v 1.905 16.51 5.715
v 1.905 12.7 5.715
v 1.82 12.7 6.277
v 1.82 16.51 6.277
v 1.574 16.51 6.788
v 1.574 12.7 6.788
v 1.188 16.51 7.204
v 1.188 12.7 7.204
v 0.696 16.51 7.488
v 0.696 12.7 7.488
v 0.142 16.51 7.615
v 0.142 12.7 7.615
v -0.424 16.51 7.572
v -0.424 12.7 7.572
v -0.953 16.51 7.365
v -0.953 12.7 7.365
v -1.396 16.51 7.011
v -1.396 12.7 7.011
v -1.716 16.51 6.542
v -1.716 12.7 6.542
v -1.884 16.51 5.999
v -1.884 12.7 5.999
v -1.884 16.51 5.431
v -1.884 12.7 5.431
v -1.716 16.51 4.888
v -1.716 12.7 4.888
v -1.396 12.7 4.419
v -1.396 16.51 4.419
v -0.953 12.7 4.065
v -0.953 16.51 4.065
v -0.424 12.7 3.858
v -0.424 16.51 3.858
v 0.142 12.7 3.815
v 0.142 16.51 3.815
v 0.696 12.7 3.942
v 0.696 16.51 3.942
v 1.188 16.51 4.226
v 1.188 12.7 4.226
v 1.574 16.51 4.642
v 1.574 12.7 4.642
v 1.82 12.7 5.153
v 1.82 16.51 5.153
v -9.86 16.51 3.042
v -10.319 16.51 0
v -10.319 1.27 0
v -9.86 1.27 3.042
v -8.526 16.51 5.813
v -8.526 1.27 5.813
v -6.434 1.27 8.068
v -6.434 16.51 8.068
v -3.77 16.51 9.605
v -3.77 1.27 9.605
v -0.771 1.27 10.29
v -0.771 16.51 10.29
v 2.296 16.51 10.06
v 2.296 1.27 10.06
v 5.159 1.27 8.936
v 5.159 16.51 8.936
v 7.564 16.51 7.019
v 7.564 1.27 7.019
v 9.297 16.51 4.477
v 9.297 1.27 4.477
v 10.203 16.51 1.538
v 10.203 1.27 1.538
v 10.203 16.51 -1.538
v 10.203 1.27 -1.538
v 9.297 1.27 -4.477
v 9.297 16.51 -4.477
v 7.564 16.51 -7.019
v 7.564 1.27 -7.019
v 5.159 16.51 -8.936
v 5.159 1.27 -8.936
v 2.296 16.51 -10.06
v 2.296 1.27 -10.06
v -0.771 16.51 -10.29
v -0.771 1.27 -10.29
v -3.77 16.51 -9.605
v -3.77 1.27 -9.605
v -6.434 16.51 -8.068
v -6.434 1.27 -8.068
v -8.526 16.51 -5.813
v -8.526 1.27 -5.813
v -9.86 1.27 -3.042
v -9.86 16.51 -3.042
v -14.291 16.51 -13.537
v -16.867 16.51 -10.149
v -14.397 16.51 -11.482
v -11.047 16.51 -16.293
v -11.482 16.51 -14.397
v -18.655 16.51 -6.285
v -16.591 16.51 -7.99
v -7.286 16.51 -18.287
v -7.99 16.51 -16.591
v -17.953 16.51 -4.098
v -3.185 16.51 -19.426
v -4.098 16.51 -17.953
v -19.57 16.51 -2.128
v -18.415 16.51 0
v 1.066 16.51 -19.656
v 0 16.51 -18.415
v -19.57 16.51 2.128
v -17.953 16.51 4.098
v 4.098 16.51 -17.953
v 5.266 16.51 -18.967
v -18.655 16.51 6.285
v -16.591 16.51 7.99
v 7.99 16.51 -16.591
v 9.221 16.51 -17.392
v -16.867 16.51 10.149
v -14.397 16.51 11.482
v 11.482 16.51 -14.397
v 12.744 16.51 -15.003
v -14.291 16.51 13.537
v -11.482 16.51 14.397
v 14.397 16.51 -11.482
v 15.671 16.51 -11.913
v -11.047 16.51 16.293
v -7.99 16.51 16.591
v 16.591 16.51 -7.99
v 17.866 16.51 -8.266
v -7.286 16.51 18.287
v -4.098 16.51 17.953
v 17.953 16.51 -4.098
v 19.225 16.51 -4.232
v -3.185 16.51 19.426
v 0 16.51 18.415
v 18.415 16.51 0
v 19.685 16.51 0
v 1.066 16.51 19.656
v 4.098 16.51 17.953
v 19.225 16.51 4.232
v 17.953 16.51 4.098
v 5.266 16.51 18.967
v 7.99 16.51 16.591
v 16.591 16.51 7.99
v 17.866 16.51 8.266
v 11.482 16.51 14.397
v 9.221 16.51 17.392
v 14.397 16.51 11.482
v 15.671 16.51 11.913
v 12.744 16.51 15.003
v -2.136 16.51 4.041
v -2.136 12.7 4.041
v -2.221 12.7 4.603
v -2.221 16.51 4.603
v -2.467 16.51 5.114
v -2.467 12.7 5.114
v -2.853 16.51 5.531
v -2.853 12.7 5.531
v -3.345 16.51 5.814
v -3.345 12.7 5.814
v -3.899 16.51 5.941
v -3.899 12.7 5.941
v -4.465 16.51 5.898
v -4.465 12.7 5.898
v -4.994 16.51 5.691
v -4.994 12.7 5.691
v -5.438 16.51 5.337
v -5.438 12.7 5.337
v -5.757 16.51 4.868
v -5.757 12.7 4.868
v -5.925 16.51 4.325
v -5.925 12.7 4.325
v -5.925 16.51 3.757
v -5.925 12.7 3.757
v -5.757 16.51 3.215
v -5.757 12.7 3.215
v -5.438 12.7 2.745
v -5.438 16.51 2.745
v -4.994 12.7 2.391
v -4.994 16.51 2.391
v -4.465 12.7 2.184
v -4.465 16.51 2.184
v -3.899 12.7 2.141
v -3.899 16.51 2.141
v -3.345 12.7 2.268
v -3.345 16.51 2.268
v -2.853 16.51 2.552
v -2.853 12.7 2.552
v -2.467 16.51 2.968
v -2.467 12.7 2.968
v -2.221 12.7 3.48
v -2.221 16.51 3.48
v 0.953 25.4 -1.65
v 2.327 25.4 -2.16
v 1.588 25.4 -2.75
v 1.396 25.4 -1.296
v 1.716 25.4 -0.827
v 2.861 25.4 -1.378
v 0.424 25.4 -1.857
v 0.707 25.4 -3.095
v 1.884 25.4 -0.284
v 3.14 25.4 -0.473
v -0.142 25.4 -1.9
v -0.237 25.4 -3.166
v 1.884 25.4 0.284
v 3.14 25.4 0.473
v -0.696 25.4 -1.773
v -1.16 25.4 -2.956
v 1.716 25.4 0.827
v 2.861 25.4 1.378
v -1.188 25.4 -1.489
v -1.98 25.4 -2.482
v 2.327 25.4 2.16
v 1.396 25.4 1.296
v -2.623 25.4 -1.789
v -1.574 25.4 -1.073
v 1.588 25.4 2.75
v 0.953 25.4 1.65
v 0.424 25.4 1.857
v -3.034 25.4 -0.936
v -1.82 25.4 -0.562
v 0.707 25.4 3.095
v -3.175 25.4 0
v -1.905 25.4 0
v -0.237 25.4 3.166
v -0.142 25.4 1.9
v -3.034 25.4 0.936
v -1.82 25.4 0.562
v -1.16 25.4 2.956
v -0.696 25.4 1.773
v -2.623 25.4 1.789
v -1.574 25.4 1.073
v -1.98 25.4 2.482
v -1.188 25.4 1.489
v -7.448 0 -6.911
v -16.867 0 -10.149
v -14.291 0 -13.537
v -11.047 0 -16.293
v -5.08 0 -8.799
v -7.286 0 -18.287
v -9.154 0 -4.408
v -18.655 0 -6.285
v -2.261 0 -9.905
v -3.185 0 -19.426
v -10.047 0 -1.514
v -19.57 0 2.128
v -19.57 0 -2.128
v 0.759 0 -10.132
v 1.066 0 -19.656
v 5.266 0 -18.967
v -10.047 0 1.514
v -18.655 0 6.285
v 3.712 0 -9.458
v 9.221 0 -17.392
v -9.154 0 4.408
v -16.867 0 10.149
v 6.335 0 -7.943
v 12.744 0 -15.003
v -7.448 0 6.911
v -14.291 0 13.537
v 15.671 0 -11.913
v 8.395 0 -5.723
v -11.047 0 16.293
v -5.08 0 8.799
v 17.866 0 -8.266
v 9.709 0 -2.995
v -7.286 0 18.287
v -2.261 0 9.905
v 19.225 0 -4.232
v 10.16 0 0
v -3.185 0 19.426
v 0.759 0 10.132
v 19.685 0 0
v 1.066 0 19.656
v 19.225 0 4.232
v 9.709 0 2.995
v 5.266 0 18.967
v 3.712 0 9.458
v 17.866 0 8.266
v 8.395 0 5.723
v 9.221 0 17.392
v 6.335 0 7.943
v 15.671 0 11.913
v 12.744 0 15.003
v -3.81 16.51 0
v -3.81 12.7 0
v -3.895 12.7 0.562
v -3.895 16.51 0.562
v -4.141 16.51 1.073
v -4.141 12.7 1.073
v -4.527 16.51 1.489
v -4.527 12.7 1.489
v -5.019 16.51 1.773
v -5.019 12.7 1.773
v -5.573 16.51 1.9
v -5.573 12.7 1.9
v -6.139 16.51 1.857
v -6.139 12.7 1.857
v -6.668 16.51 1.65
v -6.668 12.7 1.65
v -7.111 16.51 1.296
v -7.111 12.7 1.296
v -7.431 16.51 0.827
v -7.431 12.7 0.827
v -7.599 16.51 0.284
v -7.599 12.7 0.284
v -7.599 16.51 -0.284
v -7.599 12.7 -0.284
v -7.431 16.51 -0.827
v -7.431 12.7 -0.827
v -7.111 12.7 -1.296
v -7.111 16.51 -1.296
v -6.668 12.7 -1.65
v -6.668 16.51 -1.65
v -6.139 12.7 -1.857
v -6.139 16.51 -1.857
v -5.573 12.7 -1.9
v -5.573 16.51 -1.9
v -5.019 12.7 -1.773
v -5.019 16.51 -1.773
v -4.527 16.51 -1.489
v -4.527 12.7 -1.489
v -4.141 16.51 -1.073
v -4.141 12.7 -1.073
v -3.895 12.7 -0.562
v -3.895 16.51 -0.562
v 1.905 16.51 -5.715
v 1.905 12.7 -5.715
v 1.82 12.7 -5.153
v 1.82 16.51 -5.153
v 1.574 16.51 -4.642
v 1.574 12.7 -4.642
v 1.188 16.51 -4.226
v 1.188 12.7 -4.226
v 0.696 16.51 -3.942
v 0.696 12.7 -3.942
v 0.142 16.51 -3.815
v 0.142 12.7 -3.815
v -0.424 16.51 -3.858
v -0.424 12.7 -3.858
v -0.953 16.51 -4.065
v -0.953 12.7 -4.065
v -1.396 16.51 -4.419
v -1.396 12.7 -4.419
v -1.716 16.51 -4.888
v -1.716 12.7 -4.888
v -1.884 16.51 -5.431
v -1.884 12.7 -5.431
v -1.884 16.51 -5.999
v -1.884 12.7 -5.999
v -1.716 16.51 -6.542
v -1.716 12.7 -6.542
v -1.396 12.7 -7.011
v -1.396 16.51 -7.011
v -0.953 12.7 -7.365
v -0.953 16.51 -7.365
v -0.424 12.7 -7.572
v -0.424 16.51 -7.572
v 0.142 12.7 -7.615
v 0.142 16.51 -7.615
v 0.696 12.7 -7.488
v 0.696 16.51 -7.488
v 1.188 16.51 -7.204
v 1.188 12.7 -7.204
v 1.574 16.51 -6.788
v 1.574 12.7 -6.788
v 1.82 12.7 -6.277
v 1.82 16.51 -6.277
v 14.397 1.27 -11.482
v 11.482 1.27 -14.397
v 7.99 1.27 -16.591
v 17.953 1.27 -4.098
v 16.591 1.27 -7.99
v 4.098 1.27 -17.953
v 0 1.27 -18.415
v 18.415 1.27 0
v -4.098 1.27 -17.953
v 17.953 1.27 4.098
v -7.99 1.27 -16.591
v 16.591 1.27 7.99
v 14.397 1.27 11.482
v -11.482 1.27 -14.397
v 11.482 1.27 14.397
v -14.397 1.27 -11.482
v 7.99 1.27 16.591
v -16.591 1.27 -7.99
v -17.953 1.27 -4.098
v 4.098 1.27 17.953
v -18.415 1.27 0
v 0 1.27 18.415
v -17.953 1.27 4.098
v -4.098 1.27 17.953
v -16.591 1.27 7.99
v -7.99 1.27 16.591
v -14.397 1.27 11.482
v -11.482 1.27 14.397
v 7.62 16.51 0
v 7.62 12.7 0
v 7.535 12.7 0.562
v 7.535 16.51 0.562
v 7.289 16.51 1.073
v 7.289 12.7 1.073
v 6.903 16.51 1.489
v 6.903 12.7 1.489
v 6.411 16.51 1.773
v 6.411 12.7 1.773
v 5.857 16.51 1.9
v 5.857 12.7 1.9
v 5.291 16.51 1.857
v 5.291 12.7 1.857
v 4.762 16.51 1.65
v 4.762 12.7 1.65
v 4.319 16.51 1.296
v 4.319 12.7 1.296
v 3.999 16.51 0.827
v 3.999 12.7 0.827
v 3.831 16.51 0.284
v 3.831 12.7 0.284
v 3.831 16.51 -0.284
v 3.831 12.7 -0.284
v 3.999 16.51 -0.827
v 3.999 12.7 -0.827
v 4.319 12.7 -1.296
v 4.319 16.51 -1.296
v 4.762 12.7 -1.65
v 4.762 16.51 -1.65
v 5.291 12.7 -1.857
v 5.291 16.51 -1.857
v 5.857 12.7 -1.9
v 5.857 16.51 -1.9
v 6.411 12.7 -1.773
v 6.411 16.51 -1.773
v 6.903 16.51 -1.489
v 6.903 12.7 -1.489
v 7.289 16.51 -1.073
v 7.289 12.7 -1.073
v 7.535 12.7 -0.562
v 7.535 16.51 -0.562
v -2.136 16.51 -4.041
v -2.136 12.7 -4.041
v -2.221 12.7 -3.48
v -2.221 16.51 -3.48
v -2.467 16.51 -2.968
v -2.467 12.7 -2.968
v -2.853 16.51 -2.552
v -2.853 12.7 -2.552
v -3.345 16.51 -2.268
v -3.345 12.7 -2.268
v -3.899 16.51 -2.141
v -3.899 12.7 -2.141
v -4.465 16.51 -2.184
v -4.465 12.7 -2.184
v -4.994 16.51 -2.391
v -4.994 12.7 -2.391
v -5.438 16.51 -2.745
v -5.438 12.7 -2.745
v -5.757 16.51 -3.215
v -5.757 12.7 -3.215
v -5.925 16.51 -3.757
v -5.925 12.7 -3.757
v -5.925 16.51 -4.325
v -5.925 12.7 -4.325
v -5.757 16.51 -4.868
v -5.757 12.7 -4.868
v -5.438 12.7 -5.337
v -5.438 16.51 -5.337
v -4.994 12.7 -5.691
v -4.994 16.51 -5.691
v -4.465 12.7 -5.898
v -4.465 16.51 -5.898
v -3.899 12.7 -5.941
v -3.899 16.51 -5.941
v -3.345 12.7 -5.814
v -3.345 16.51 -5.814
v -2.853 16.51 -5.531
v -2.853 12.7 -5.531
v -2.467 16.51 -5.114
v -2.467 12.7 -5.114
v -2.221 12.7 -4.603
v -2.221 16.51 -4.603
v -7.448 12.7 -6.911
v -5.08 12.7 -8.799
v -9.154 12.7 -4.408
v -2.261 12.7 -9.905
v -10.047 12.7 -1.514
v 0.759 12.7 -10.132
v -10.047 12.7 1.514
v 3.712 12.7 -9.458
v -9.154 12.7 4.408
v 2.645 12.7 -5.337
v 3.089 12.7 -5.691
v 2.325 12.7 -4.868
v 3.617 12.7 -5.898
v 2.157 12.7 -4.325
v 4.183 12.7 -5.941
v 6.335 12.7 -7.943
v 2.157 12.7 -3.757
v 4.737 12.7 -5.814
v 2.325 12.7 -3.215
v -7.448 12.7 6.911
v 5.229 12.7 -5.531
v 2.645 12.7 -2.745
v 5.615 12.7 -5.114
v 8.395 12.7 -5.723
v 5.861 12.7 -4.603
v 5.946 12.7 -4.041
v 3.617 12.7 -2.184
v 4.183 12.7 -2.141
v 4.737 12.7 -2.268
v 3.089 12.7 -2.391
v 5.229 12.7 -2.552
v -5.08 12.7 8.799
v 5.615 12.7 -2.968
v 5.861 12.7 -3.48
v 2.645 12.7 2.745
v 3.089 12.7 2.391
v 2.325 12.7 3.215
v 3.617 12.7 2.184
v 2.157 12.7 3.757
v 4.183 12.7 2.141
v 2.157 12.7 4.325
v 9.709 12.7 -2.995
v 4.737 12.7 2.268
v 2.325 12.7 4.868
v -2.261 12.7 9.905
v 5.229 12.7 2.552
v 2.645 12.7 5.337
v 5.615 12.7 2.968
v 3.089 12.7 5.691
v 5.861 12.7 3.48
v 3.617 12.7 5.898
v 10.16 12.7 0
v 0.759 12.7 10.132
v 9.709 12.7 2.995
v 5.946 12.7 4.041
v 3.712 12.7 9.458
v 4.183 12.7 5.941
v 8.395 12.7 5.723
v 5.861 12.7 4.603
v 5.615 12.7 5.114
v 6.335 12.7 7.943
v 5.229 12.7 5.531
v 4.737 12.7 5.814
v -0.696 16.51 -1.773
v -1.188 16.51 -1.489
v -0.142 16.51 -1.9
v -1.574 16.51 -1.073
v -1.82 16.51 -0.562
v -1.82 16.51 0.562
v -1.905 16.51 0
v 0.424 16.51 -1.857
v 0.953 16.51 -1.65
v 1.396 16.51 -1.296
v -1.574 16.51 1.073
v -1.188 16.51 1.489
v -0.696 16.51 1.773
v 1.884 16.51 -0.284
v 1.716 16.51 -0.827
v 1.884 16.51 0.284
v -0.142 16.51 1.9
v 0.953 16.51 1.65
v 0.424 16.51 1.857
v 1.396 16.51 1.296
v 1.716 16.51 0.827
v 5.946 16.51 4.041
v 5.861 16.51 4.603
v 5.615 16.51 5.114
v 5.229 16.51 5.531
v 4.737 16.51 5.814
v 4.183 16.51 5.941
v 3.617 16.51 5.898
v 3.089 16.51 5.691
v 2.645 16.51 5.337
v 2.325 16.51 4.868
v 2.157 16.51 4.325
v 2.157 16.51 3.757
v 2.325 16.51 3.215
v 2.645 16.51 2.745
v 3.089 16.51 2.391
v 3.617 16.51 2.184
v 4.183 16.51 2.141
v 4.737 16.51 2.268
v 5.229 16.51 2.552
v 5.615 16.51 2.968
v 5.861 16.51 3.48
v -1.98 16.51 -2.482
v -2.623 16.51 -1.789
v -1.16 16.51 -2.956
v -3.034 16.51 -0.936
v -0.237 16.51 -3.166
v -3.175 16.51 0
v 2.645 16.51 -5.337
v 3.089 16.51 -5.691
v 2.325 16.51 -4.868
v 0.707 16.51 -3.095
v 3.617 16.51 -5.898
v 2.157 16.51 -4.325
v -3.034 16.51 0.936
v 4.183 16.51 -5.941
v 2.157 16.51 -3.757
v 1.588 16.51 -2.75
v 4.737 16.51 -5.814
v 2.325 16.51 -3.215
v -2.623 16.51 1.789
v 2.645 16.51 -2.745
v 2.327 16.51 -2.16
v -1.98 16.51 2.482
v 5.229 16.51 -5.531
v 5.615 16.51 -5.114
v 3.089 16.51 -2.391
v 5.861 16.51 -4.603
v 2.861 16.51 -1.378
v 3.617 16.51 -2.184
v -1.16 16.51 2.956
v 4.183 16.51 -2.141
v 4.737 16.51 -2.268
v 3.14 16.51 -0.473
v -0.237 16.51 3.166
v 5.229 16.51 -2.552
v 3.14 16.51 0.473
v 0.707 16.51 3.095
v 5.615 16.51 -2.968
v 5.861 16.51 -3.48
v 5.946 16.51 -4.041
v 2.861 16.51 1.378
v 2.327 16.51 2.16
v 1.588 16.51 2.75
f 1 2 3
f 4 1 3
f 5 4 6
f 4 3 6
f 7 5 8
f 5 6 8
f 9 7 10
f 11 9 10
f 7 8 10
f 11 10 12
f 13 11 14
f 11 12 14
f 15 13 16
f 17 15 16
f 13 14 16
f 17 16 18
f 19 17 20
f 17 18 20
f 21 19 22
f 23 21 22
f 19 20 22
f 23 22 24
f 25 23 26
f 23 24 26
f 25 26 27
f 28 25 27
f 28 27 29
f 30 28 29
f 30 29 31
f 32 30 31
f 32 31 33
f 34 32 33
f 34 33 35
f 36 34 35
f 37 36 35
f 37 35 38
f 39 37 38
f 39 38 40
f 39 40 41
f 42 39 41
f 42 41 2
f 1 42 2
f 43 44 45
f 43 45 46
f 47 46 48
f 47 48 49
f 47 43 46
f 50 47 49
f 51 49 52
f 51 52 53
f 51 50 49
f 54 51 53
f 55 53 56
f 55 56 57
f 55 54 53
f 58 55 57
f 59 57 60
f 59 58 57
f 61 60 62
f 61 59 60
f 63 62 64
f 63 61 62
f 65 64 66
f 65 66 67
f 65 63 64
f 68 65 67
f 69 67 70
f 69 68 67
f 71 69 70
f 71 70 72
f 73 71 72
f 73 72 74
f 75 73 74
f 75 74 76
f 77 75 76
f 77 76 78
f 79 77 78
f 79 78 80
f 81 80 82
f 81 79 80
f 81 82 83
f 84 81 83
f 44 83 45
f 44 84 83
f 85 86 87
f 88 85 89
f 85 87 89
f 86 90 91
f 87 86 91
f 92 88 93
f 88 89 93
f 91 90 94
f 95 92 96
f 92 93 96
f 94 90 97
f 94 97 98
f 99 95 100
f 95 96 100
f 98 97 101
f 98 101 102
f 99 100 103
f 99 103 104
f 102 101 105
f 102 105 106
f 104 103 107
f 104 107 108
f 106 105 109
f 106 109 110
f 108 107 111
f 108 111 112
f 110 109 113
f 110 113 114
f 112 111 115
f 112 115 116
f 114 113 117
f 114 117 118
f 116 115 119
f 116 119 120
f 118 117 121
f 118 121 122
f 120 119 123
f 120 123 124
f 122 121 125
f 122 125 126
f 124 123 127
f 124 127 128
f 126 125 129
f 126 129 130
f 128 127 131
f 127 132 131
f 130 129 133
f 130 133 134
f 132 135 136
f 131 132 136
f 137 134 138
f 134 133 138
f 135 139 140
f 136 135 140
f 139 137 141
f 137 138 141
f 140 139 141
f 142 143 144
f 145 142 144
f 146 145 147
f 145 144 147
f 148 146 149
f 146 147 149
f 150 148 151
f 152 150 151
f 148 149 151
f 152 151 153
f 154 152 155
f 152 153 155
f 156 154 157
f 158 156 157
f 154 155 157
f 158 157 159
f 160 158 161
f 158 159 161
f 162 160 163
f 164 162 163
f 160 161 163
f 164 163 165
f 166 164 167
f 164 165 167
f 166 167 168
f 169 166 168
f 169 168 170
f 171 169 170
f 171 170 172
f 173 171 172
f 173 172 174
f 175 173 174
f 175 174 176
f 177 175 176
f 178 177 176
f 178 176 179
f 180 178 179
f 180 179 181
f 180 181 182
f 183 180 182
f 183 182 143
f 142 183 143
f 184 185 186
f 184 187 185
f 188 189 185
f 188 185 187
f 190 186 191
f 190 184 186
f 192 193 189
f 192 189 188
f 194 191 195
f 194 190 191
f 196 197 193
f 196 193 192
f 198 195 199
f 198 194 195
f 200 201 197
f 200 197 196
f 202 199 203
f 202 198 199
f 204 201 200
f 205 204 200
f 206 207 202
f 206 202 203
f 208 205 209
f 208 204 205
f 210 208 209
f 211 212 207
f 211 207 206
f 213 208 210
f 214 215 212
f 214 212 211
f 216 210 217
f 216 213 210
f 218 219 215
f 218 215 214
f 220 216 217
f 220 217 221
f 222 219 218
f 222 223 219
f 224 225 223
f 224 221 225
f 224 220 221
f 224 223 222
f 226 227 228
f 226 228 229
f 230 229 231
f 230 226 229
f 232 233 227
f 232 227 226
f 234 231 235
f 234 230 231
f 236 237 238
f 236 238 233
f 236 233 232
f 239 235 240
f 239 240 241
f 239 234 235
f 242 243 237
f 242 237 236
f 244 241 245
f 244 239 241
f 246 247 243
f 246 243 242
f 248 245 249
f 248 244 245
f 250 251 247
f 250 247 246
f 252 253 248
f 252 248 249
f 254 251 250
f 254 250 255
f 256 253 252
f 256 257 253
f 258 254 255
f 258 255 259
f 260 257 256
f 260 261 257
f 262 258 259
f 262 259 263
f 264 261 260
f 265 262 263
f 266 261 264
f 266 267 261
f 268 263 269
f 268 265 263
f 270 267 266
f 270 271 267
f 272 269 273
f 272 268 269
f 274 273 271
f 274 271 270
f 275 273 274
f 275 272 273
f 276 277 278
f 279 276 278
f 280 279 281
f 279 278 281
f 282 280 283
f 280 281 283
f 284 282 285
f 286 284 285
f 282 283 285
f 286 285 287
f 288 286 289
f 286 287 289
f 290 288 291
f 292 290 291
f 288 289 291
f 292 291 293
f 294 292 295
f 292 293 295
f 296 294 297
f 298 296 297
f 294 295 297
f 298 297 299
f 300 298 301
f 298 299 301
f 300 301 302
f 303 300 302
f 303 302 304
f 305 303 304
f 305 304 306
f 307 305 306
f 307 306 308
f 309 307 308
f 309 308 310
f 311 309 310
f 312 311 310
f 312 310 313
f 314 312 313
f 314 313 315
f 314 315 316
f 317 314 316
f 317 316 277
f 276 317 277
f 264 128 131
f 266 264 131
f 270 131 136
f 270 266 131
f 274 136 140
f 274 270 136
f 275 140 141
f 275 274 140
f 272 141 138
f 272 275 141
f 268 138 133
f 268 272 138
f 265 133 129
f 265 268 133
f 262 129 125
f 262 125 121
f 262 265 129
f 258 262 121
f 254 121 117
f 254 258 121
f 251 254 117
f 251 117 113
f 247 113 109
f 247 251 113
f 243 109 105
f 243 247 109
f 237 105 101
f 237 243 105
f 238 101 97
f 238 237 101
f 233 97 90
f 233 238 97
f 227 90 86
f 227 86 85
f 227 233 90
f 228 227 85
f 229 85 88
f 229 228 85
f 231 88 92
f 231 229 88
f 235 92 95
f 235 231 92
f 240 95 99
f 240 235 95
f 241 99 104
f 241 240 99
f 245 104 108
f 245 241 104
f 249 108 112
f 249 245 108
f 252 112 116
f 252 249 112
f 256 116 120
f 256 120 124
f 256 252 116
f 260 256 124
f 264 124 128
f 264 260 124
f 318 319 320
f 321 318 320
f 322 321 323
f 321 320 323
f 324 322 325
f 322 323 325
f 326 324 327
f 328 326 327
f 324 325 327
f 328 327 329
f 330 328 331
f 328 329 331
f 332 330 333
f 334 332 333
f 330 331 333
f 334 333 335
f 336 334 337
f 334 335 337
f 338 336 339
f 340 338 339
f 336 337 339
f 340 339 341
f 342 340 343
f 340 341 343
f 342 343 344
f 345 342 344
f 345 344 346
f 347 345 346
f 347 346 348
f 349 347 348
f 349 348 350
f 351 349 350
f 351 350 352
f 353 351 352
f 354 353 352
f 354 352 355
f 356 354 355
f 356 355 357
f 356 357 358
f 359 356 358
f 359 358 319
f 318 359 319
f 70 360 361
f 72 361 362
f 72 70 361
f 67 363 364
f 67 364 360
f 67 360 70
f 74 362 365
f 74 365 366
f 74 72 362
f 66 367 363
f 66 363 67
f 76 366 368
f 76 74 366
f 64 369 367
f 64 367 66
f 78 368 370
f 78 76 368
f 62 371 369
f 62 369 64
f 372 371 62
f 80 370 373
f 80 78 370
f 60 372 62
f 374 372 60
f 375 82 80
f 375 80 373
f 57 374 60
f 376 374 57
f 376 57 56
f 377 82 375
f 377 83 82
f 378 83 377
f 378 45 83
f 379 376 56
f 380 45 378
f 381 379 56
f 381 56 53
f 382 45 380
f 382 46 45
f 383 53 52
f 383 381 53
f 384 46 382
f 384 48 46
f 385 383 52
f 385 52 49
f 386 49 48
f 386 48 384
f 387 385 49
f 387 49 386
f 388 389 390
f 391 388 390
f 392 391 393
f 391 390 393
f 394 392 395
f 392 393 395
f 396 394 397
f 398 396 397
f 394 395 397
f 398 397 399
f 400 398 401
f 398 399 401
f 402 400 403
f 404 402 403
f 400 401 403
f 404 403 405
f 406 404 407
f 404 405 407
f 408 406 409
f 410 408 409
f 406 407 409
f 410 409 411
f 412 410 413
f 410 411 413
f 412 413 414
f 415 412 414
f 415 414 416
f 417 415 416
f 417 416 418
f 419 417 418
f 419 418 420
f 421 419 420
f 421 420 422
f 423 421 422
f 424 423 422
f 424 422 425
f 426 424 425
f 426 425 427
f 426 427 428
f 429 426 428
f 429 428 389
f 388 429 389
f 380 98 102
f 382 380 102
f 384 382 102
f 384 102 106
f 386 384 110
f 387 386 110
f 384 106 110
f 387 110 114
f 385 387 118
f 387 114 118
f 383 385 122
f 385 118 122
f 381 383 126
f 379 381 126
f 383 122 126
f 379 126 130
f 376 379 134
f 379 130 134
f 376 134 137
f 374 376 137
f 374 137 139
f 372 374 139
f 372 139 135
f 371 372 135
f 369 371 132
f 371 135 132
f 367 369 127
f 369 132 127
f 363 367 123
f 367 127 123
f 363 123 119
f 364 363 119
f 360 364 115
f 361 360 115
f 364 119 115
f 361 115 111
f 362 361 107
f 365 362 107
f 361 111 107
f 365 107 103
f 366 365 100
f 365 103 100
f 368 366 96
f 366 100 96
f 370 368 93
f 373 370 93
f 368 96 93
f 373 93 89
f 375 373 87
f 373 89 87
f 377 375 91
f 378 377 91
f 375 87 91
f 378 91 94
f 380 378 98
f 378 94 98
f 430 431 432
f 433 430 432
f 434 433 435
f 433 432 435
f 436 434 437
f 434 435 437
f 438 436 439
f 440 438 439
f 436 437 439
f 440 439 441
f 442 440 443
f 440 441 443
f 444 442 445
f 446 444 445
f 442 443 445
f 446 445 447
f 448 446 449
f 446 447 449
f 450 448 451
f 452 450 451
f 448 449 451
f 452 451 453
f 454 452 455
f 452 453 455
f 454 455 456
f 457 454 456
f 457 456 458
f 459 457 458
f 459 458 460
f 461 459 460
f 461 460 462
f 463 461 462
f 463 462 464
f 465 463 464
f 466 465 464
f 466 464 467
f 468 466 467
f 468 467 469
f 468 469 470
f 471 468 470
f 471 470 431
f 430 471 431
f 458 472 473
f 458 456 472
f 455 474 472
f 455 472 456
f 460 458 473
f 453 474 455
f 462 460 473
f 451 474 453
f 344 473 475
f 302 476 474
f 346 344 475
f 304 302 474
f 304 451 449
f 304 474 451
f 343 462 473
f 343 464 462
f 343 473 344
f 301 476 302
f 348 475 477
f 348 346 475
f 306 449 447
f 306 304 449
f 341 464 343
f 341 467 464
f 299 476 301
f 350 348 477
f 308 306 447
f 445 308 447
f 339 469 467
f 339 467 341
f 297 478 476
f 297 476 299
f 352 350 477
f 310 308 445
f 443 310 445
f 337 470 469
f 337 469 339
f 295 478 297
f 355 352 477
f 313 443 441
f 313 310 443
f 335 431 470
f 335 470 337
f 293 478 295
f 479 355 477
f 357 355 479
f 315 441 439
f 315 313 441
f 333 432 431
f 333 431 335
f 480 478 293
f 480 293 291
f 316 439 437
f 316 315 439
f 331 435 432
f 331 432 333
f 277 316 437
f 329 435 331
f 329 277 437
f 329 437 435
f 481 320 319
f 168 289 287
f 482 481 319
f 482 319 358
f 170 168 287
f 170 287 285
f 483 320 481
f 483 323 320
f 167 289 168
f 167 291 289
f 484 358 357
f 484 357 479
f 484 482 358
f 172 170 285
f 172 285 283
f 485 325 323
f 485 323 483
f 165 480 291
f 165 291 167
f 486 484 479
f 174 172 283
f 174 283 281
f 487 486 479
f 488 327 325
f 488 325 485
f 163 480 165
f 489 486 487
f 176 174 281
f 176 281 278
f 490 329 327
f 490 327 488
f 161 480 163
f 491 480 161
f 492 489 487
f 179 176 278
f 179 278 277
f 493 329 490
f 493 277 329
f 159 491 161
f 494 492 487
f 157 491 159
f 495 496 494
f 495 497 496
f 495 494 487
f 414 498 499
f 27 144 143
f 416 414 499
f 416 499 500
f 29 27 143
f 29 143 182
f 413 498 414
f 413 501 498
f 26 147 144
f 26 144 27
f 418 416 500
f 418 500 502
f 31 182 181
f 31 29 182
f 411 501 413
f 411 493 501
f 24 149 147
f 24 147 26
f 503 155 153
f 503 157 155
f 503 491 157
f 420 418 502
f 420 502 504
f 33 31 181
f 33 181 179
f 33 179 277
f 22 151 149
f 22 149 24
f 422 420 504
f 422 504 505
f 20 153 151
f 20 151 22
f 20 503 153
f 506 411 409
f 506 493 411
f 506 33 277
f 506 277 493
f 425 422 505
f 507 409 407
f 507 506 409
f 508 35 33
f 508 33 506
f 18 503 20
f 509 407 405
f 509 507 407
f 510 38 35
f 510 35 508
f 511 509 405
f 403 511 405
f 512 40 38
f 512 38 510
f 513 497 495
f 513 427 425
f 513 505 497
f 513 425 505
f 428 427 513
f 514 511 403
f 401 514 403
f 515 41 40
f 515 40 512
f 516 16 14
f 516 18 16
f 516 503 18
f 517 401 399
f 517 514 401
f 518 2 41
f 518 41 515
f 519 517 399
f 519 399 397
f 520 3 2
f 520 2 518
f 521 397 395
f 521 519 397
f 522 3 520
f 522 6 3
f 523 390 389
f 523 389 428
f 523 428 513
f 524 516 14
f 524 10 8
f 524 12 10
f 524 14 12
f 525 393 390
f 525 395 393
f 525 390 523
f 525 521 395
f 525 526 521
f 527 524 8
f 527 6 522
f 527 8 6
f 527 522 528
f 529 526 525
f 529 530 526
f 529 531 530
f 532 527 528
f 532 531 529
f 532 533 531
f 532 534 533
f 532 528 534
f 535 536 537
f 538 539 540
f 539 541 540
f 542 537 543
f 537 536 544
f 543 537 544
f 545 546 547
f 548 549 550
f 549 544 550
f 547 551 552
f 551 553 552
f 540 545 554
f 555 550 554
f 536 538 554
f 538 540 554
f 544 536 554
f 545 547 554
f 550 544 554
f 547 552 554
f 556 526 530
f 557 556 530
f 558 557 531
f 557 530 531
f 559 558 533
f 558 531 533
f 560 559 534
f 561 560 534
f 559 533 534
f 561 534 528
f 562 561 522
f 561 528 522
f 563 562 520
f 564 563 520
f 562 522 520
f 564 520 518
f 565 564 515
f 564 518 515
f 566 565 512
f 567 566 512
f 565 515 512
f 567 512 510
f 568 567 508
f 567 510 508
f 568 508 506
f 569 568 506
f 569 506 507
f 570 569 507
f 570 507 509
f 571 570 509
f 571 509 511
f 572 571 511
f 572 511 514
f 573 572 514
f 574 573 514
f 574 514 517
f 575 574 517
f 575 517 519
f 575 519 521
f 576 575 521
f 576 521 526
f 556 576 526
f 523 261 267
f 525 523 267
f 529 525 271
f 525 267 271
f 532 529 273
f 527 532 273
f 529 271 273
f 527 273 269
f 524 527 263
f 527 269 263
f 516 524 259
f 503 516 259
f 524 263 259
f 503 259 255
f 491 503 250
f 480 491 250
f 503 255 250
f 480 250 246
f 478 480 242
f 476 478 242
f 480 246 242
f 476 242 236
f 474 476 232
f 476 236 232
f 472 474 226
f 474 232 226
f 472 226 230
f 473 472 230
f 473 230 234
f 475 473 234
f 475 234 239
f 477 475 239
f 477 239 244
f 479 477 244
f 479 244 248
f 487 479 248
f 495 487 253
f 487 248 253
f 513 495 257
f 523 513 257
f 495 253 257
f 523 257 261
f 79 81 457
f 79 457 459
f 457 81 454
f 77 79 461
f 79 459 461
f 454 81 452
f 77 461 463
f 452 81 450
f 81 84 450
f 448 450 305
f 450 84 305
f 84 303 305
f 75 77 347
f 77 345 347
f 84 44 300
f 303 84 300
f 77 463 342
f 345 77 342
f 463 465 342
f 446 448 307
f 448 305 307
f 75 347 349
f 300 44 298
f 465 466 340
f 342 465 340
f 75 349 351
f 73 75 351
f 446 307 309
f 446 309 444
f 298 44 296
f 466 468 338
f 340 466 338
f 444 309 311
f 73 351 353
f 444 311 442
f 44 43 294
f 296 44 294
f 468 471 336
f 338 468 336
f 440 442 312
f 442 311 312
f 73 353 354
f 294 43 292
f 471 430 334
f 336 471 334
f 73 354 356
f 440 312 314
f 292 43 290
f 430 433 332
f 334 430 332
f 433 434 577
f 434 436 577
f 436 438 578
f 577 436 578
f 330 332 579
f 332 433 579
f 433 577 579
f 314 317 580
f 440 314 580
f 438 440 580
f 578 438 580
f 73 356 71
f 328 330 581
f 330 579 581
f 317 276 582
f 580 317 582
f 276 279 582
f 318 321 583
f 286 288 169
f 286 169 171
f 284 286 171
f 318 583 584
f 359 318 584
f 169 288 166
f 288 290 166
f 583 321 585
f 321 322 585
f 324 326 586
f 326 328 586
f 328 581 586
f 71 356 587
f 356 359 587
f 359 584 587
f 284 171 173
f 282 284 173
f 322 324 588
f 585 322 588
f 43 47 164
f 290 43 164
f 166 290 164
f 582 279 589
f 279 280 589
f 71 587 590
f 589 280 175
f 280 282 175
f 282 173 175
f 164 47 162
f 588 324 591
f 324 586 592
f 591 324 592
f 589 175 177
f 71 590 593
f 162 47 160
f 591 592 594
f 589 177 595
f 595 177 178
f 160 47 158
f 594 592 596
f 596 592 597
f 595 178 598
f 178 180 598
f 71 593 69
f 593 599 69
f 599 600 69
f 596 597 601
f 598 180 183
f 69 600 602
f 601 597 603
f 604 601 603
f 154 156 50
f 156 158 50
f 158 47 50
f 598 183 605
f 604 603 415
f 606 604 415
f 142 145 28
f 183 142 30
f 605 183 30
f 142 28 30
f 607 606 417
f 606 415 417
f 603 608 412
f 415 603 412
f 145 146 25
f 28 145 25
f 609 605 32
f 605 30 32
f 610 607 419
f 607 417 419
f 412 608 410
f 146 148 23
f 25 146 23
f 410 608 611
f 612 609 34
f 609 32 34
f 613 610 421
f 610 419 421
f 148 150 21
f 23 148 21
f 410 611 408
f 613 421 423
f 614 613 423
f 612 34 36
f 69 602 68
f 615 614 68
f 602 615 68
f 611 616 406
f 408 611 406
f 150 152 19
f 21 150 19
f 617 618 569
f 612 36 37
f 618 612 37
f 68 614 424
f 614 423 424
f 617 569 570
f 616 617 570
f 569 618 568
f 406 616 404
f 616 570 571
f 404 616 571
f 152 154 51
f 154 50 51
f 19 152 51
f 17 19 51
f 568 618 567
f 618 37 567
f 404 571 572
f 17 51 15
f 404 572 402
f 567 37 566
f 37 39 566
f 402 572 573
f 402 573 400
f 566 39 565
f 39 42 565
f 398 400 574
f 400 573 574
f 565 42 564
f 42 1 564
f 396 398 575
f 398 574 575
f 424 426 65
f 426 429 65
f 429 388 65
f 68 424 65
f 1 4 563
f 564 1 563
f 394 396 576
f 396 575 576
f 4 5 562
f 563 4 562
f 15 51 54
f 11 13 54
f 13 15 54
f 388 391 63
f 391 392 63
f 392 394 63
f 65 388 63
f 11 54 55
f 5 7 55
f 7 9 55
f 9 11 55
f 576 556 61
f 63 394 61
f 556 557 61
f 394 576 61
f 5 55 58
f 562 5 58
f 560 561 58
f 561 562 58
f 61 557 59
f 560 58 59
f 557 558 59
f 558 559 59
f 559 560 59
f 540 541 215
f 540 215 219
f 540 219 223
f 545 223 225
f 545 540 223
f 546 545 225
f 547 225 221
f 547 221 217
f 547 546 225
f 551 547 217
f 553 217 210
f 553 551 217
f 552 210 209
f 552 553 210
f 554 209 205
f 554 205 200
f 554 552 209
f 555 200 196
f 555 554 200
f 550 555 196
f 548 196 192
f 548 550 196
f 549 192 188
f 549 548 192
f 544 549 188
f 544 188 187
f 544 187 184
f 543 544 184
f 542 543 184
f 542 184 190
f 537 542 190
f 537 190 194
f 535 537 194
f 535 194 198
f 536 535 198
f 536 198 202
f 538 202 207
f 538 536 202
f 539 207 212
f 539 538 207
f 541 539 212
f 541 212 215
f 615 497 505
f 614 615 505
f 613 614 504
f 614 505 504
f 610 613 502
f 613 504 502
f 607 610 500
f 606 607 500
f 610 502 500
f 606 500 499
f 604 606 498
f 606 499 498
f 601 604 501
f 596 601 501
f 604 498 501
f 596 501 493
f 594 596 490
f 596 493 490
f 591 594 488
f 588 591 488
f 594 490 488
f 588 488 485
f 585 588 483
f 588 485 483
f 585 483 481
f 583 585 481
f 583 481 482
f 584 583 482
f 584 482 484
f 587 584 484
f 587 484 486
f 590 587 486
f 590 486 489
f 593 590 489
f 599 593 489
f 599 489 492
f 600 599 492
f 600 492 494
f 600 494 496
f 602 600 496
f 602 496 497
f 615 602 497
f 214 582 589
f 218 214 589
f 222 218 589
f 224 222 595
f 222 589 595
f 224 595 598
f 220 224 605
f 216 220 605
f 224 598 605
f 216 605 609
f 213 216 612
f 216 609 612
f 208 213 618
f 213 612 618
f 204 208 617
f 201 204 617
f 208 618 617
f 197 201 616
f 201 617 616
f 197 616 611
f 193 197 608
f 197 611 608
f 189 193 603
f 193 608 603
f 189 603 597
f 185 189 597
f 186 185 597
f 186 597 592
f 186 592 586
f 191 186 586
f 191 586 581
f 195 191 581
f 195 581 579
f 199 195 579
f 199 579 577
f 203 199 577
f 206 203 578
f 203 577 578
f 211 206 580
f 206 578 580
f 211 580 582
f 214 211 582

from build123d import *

# Parameters (mm, degrees)
F0_R     = 19.685
F2_DEPTH = 16.51
F1_R     = 10.16
F3_DEPTH = 12.7
F4_R     = 1.905
F5_DEPTH = 25.4
F6_R     = 18.415
F6_R_2   = 10.31875
F7_DEPTH = 15.24
F8_R     = 3.175
F8_R_2   = 1.905
F9_DEPTH = 8.89


with BuildPart() as f2:
    # F0 (on Front) → F2 (new body)
    with BuildSketch(Plane.XZ):
        Circle(F0_R)
    extrude(amount=-F2_DEPTH)

    # F1 (on face) → F3 (cut)
    with BuildSketch(Plane.XZ):
        Circle(F1_R)
    extrude(amount=-F3_DEPTH, mode=Mode.SUBTRACT)

    # F4 (on face) → F5 (cut)
    with BuildSketch(Plane.XZ.offset(-12.7)):
        with Locations((0, 5.715)):
            Circle(F4_R)
        with Locations((4.041115, 4.041115)):
            Circle(F4_R)
        with Locations((5.715, 0)):
            Circle(F4_R)
        with Locations((4.041115, -4.041115)):
            Circle(F4_R)
        with Locations((0, -5.715)):
            Circle(F4_R)
        with Locations((-4.041115, -4.041115)):
            Circle(F4_R)
        with Locations((-4.041115, 4.041115)):
            Circle(F4_R)
        with Locations((-5.715, 0)):
            Circle(F4_R)
    extrude(amount=-F5_DEPTH, mode=Mode.SUBTRACT)

    # F6 (on face) → F7 (cut)
    with BuildSketch(Plane(origin=(0, 16.51, 0), x_dir=(-1, 0, 0), z_dir=(0, 1, 0))):
        Circle(F6_R)
        Circle(F6_R_2, mode=Mode.SUBTRACT)
    extrude(amount=-F7_DEPTH, mode=Mode.SUBTRACT)

    # F8 (on face) → F9 (join)
    with BuildSketch(Plane(origin=(0, 16.51, 0), x_dir=(-1, 0, 0), z_dir=(0, 1, 0))):
        Circle(F8_R)
        Circle(F8_R_2, mode=Mode.SUBTRACT)
    extrude(amount=F9_DEPTH)


solid = f2.part
